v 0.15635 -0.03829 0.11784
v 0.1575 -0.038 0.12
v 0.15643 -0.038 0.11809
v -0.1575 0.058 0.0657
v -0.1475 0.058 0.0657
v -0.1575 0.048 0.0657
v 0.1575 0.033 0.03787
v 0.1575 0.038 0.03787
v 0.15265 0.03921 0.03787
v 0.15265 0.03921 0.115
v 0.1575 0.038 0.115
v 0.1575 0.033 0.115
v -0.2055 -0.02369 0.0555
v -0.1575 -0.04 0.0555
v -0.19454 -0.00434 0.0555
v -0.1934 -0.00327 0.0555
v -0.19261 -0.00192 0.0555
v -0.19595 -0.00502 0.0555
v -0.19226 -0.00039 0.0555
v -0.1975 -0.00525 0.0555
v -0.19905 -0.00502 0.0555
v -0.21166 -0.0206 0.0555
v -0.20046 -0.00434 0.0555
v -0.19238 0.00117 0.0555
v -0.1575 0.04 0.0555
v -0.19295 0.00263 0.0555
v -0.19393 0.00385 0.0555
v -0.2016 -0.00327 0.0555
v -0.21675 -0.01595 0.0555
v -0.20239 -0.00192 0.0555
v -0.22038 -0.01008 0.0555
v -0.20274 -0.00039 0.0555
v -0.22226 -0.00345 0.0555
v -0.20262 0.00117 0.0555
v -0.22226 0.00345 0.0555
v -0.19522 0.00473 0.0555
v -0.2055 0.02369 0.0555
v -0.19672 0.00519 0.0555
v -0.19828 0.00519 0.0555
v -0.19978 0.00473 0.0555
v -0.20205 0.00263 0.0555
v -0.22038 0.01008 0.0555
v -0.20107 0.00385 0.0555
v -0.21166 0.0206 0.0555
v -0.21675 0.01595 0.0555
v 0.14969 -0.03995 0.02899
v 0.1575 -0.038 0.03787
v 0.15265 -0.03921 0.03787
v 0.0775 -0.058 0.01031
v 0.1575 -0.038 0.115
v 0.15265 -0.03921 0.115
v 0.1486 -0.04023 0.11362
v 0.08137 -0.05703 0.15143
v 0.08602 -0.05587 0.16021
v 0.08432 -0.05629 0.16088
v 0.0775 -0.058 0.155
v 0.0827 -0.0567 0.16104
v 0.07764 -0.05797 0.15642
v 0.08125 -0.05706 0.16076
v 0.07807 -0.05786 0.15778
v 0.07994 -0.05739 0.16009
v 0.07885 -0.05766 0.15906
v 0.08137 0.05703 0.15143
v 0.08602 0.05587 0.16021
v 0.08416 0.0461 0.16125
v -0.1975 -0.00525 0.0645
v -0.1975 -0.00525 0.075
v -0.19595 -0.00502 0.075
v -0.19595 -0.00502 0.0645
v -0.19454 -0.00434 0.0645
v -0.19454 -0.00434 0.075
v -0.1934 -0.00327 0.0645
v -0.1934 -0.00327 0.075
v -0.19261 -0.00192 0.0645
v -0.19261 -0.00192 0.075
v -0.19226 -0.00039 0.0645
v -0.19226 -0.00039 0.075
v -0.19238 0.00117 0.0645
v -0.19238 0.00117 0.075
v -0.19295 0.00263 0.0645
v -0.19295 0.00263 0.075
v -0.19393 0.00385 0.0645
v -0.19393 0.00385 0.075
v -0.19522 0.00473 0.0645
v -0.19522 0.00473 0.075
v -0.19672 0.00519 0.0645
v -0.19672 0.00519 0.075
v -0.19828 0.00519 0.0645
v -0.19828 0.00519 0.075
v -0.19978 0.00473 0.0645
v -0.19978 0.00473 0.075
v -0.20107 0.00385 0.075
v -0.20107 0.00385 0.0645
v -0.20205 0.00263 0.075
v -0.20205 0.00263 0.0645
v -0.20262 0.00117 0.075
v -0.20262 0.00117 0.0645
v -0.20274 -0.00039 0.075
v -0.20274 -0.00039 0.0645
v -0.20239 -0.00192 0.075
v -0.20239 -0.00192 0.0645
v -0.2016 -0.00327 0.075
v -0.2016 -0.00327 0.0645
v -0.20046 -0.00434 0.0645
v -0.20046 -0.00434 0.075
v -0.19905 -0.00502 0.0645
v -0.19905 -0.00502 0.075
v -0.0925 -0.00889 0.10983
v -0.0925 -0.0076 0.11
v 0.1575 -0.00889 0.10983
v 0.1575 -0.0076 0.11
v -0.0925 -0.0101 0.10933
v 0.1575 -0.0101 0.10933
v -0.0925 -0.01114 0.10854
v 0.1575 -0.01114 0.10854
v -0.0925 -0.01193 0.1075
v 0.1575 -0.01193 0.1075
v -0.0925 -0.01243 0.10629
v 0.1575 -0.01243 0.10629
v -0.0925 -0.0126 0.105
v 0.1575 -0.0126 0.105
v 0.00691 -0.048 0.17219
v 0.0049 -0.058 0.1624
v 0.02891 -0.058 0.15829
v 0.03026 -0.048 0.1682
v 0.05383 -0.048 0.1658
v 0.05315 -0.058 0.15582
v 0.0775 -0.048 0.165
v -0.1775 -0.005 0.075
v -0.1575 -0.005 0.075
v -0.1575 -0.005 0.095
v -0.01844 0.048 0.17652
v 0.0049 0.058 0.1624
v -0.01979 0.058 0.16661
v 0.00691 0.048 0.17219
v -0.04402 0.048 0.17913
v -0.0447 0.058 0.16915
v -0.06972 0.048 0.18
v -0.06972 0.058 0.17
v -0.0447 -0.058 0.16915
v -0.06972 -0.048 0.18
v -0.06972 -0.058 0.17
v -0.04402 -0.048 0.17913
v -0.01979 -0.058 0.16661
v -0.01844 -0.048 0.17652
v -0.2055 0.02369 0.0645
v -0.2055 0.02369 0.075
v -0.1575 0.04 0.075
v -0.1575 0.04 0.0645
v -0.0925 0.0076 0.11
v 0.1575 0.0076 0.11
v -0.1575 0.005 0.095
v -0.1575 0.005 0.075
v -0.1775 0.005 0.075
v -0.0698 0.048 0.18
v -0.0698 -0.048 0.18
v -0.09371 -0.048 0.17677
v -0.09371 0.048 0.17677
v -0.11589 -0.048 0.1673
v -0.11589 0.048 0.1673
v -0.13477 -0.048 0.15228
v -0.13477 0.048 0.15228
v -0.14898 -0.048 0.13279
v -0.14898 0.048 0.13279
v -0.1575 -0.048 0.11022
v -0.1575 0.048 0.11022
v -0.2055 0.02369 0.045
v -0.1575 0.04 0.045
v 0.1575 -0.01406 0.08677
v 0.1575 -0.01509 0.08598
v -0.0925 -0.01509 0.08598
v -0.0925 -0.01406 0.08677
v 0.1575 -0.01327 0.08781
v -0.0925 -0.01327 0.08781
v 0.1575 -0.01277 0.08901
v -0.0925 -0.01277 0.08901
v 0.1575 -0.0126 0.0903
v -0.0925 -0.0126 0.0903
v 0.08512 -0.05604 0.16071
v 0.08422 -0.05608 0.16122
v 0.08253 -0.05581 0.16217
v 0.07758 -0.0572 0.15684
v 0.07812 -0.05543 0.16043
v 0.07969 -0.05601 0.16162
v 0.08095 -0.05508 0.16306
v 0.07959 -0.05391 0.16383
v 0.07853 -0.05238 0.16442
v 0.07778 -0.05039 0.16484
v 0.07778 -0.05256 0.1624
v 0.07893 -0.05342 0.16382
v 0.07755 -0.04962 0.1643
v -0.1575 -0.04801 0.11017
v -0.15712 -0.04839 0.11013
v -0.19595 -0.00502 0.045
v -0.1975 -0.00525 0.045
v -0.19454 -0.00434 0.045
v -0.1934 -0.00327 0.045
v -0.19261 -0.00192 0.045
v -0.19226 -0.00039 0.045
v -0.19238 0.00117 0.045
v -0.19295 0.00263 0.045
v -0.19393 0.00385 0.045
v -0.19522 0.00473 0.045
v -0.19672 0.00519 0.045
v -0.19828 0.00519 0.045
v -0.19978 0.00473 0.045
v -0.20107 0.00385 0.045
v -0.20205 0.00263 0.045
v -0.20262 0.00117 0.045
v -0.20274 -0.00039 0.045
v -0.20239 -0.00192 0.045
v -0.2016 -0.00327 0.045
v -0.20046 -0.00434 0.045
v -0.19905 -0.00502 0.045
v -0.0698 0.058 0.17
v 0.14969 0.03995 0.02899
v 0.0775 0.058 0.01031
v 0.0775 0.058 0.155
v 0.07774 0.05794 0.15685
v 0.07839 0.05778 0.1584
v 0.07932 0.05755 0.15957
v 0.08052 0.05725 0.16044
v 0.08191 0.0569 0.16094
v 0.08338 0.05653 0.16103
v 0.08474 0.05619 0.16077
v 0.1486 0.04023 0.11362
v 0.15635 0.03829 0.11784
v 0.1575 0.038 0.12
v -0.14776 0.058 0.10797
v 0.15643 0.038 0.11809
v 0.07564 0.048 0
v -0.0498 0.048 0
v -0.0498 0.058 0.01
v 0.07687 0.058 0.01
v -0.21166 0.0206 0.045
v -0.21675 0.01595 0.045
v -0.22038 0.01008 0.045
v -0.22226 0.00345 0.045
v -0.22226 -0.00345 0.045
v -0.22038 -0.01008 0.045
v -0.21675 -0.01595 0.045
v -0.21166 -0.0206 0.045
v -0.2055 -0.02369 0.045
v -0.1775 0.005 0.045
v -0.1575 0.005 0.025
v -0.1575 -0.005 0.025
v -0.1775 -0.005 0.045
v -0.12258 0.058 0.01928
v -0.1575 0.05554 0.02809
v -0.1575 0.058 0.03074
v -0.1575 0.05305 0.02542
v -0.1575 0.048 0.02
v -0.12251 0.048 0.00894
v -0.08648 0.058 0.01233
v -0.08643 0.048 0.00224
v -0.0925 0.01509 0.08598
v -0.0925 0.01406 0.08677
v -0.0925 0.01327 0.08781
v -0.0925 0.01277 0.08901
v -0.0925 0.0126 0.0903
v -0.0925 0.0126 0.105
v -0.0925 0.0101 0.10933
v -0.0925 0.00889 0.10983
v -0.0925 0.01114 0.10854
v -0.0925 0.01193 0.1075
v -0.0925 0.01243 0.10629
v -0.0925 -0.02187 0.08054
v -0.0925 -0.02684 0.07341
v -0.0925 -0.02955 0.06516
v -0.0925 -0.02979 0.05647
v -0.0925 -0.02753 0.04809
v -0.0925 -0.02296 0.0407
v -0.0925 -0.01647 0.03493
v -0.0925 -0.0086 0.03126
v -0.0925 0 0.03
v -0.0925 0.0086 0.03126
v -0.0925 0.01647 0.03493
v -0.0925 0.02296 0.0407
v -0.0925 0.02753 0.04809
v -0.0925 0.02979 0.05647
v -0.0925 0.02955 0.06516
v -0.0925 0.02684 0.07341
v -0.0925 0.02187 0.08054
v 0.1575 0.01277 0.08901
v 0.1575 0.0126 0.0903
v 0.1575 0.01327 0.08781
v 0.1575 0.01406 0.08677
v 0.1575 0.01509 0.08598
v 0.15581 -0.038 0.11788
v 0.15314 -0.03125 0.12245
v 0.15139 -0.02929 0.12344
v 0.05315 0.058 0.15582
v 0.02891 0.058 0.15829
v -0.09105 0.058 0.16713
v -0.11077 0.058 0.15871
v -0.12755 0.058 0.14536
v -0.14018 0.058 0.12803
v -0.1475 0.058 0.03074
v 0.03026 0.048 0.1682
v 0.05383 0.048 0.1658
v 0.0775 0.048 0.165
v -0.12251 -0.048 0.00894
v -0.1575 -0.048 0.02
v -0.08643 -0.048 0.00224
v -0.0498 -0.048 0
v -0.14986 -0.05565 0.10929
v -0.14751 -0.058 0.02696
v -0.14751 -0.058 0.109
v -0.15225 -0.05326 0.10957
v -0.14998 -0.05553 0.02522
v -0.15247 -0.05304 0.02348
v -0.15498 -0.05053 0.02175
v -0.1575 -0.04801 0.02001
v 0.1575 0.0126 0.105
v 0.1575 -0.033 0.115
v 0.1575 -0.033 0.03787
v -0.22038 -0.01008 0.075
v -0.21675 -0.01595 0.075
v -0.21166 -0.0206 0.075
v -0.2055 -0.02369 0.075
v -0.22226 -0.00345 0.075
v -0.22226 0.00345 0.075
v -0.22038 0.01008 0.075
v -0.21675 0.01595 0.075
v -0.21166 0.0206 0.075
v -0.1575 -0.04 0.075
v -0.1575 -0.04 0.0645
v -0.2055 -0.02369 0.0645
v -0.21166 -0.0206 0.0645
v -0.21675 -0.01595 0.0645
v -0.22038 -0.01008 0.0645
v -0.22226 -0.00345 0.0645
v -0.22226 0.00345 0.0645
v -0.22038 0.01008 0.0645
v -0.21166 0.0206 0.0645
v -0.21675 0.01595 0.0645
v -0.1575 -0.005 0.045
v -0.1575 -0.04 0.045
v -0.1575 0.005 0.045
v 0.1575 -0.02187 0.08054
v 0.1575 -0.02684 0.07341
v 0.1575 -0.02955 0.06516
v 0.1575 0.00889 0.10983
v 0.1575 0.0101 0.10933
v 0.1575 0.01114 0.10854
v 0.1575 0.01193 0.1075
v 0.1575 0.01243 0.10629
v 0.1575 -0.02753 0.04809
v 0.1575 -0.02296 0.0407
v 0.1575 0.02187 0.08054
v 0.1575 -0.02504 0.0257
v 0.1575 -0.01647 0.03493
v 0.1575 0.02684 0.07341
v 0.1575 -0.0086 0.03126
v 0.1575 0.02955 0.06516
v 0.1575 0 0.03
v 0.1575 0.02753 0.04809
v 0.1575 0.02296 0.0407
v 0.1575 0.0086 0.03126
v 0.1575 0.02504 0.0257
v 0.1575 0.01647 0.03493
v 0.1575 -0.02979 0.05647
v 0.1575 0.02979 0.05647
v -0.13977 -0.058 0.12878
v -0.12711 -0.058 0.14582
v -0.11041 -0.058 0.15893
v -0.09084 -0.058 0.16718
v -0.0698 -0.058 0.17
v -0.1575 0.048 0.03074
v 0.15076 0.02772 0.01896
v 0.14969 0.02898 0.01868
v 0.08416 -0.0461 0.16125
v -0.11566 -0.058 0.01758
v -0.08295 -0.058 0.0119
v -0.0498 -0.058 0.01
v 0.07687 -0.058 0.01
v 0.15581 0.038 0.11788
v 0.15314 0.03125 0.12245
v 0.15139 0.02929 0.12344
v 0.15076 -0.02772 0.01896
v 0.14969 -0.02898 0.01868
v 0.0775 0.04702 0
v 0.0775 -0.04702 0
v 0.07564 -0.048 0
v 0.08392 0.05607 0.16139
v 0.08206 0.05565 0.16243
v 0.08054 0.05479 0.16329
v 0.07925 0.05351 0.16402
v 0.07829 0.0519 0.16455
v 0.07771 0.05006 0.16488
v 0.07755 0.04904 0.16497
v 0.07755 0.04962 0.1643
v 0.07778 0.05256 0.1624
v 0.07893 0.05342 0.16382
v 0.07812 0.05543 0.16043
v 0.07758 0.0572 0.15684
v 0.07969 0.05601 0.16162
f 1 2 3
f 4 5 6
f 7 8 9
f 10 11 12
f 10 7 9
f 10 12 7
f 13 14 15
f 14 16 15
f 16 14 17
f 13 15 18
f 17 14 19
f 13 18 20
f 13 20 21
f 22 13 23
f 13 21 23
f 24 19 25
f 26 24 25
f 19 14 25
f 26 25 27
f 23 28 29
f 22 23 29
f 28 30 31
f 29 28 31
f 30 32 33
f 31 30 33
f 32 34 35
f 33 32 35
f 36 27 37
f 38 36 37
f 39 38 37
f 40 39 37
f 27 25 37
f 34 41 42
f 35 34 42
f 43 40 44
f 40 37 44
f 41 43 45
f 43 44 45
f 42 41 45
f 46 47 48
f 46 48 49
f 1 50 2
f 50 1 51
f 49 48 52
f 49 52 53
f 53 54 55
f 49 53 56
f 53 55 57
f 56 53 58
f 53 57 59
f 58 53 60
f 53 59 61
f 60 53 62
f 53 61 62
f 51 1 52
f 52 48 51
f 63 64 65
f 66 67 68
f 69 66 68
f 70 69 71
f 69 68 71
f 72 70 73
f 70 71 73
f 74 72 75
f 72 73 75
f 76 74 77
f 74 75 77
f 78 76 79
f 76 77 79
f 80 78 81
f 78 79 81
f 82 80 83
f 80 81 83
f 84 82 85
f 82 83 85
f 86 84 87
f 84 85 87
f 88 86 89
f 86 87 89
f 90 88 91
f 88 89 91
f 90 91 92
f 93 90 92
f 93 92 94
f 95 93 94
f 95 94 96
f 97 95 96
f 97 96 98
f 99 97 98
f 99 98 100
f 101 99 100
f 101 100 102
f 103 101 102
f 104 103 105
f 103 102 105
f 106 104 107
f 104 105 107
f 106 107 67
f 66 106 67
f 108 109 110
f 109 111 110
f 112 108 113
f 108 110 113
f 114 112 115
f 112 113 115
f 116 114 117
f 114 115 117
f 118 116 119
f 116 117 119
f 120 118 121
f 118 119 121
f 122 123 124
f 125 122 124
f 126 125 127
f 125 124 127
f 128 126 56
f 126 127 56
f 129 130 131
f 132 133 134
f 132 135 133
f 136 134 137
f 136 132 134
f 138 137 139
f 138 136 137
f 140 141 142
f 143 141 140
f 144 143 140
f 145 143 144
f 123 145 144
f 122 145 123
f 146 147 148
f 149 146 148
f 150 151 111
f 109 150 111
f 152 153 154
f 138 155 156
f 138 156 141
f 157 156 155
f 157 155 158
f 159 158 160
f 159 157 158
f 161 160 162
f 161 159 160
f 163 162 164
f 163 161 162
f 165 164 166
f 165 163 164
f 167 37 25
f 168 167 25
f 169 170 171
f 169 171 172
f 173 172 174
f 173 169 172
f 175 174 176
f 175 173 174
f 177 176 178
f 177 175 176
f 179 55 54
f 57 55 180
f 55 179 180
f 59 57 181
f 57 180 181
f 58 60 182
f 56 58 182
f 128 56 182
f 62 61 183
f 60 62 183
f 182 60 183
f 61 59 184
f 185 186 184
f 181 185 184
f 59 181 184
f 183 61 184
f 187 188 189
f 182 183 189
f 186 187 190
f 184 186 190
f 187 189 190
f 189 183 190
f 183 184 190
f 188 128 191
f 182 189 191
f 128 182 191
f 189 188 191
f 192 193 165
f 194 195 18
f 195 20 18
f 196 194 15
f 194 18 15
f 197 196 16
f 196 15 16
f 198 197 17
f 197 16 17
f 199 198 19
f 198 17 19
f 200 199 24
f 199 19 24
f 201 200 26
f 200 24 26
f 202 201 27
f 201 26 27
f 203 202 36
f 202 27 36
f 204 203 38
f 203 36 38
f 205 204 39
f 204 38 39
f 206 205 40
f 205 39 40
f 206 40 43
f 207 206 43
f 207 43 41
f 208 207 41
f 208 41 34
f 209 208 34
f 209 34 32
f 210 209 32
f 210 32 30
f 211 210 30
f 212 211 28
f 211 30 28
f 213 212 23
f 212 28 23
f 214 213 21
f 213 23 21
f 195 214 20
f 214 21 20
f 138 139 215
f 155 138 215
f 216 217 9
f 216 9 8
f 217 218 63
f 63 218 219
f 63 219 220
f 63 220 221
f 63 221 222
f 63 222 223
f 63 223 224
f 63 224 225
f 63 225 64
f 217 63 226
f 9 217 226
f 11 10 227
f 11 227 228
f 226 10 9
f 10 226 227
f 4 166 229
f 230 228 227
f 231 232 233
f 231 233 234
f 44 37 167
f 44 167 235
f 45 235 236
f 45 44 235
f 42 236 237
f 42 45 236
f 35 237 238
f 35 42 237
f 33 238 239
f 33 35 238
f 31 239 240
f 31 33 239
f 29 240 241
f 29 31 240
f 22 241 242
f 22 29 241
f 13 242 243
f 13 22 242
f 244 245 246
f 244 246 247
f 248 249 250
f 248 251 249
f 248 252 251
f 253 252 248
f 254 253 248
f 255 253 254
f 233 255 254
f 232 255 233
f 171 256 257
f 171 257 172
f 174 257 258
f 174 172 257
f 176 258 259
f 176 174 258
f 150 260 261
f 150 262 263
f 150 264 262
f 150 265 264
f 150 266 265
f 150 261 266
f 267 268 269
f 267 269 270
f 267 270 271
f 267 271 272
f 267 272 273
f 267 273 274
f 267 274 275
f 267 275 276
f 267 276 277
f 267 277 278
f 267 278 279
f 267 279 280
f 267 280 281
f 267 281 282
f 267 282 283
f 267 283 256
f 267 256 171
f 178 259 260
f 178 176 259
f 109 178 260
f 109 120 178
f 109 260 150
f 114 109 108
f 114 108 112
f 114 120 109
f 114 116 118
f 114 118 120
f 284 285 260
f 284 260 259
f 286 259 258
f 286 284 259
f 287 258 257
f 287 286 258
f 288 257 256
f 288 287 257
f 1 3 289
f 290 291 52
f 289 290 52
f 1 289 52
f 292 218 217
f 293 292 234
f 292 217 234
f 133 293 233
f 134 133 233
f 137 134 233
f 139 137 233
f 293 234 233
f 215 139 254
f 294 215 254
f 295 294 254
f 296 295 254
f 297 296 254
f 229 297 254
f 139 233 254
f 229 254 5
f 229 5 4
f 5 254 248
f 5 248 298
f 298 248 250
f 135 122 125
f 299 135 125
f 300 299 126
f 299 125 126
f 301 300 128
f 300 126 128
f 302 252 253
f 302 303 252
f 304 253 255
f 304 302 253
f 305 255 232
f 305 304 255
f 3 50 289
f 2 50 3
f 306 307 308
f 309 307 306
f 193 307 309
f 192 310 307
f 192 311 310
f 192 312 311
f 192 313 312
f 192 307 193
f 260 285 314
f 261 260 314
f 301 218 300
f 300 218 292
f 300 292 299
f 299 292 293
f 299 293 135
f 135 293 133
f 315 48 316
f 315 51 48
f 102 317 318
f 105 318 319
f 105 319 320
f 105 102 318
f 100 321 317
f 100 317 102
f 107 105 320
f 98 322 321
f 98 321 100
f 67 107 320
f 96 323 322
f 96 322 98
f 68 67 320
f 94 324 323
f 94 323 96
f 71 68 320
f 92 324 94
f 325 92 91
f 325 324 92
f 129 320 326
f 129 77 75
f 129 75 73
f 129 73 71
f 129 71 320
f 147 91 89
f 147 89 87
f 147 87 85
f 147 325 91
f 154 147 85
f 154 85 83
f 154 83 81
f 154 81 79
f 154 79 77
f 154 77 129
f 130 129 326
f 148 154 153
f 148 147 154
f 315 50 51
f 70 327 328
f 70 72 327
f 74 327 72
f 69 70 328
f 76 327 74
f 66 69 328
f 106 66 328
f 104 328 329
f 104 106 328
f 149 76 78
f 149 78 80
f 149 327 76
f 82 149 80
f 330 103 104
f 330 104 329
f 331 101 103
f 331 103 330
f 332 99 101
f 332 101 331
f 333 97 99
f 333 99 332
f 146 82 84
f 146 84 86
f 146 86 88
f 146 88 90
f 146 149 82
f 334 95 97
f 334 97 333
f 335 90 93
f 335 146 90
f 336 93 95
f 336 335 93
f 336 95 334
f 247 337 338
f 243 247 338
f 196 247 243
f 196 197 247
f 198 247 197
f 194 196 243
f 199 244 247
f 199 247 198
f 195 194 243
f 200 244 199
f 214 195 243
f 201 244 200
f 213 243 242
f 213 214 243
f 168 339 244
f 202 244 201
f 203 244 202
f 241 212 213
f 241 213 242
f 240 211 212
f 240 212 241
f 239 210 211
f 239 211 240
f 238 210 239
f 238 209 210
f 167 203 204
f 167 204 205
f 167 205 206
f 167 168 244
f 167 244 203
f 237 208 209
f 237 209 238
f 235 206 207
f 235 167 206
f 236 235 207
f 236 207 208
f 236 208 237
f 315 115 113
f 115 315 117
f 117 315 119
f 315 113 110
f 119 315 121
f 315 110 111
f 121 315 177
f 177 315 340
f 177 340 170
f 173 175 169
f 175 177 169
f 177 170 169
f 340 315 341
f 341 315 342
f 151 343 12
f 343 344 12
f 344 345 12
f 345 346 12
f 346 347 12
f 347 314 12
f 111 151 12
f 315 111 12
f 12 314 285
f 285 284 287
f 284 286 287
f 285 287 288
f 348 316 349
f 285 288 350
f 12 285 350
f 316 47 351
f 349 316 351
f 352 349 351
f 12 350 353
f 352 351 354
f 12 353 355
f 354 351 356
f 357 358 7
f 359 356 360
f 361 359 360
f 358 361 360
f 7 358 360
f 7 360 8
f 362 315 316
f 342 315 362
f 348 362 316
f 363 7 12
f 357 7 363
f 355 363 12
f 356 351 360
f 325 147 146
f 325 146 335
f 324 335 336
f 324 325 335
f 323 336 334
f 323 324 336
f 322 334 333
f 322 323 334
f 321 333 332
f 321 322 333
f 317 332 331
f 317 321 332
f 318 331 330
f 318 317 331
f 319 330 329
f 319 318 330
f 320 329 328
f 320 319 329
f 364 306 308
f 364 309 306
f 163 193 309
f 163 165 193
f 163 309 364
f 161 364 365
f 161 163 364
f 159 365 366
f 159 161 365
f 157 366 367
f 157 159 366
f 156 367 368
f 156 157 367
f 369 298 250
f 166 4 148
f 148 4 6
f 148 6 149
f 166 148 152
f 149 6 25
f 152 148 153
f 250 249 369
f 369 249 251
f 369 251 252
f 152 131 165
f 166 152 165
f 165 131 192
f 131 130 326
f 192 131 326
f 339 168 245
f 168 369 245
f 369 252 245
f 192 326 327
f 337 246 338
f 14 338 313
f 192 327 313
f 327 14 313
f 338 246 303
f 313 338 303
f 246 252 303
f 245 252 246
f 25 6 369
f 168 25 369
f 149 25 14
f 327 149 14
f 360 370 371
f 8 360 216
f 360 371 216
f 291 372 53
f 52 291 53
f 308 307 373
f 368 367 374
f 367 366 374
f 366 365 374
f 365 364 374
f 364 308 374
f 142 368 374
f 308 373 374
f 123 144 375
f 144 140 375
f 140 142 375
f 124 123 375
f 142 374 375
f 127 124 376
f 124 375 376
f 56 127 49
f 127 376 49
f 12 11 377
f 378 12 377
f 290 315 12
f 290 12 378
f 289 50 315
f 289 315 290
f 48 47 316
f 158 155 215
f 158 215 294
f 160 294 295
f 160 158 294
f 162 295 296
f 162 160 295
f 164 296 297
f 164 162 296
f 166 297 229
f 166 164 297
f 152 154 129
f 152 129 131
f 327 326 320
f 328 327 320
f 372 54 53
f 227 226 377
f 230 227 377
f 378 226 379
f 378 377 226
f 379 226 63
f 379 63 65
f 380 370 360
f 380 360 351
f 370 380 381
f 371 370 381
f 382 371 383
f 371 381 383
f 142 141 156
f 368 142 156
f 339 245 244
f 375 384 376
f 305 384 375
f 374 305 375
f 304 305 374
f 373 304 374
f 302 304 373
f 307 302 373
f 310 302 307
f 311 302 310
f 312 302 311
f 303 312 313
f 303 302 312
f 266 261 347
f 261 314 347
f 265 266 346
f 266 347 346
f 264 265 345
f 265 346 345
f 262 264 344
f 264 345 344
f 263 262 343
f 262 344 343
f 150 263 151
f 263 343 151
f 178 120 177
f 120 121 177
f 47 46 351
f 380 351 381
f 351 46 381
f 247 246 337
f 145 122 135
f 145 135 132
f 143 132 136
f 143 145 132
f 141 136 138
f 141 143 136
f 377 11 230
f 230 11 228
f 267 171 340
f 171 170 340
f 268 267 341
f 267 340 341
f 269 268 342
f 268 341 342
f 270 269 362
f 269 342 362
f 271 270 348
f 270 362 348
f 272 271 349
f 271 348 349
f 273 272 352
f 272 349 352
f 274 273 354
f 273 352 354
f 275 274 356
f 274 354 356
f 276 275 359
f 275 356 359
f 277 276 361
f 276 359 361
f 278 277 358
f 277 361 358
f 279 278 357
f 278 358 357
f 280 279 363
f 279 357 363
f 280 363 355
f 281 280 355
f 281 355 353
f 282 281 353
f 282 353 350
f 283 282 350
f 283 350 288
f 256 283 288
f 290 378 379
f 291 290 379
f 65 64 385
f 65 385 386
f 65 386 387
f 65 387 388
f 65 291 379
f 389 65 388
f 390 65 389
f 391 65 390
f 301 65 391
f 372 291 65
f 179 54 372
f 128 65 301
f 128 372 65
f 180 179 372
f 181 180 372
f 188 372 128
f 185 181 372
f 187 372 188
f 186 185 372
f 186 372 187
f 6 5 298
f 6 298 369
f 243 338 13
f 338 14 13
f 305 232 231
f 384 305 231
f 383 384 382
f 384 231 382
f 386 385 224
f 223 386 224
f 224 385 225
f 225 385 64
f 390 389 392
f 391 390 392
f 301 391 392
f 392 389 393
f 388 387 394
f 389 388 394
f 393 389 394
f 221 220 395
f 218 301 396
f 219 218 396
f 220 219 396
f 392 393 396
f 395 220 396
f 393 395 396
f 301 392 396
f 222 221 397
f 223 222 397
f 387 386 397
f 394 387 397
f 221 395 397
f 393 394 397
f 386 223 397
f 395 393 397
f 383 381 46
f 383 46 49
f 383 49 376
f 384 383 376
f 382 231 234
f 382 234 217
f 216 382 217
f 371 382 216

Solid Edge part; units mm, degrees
sketch "Sketch1" plane through (0, 0, 0) normal (0, 0, 1) x (1, 0, 0)
  line L0 (-0.1575, -0.058) -> (0.1575, -0.058)
  line L1 (0.1575, -0.058) -> (0.1575, 0.058)
  line L2 (0.1575, 0.058) -> (-0.1575, 0.058)
  line L3 (-0.1575, 0.058) -> (-0.1575, -0.058)
  dimension "D1" = 0.116
  dimension "D2" = 0.315
extrude "Protrusion1" add sketch "Sketch1" along normal blind 0.18
sketch "Sketch2" plane through (0.1575, 0, 0.09) normal (1, 0, 0) x (0, 1, 0)
  line L0 (0.0126, 0.0003) -> (0.0126, 0.015)
  arc A0 (0.0076, 0.02) -> (0.0126, 0.015) centre (0.0076, 0.015) cw
  line L1 (0.0076, 0.02) -> (-0.0076, 0.02)
  arc A1 (-0.0076, 0.02) -> (-0.0126, 0.015) centre (-0.0076, 0.015) ccw
  line L2 (-0.0126, 0.015) -> (-0.0126, 0.0003)
  arc A2 (-0.0151, -0.004) -> (-0.0126, 0.0003) centre (-0.0176, 0.0003) ccw
  arc A3 (0.0126, 0.0003) -> (0.0151, -0.004) centre (0.0176, 0.0003) ccw
  arc A4 (-0.0151, -0.004) -> (0.0151, -0.004) centre (0, -0.03) ccw
extrude "Ausschnitt_1" cut sketch "Sketch2" against normal blind 0.25
sketch "Sketch3" plane through (0, 0, 0) normal (0, -1, 0) x (1, 0, 0)
  line L0 (-0.1575, 0.075) -> (-0.1575, 0.045)
  line L1 (-0.1575, 0.045) -> (-0.2225, 0.045)
  line L2 (-0.2225, 0.045) -> (-0.2225, 0.075)
  line L3 (-0.2225, 0.075) -> (-0.1575, 0.075)
  dimension "D1" = 0.06
  dimension "D2" = 0.03
  dimension "D3" = 0.065
extrude "Ausprägung_2" add sketch "Sketch3" along normal mid plane 0.08
sketch "Sketch4" plane through (-0.19, 0, 0.075) normal (0, 0, 1) x (1, 0, 0)
  line L0 (0.0325, -0.04) -> (-0.0325, -0.04)
  line L1 (-0.0325, -0.04) -> (-0.0325, 0)
  line L2 (0.0325, -0.04) -> (-0.0155, -0.0237)
  arc A0 (-0.0325, 0) -> (-0.0155, -0.0237) centre (-0.0075, 0) ccw
extrude "Cutout1" cut sketch "Sketch4" against normal through all
mirror "Mirror1" about plane through (0, 0, 0) normal (0, -1, 0) of "Cutout1"
hole "Bohrung_1" at (-0.1975, 0, 0.075) direction (0, 0, -1) diameter 0.0105 end through all
sketch "Sketch5" plane through (0, 0, 0) normal (0, -1, 0) x (1, 0, 0)
  line L0 (-0.1575, 0.0645) -> (-0.1575, 0.0555)
  line L1 (-0.1575, 0.0555) -> (-0.2225, 0.0555)
  line L2 (-0.2225, 0.0645) -> (-0.2225, 0.0555)
  line L3 (-0.1575, 0.0645) -> (-0.2225, 0.0645)
  dimension "D1" = 0.015
  dimension "D2" = 0.009
extrude "Cutout3" cut sketch "Sketch5" along normal through all and the other way through all
sketch "Sketch6" plane through (0, 0, 0) normal (0, -1, 0) x (1, 0, 0)
  line L0 (-0.1575, 0.075) -> (-0.1775, 0.075)
  line L1 (-0.1775, 0.075) -> (-0.1575, 0.095)
  line L2 (-0.1575, 0.095) -> (-0.1575, 0.075)
  line L3 (-0.1575, 0.045) -> (-0.1575, 0.025)
  line L4 (-0.1575, 0.025) -> (-0.1775, 0.045)
  line L5 (-0.1775, 0.045) -> (-0.1575, 0.045)
  dimension "D1" = 0.02
extrude "Ausprägung_3" add sketch "Sketch6" along normal mid plane 0.01
sketch "Sketch7" plane through (0, -0.058, 0.09) normal (0, -1, 0) x (1, 0, 0)
  line L0 (-0.1575, -0.07) -> (-0.1575, -0.09)
  line L1 (-0.1575, -0.09) -> (-0.0498, -0.09)
  arc A0 (-0.0498, -0.09) -> (-0.1575, -0.07) centre (-0.0498, 0.21) cw
  line L2 (-0.1575, 0.09) -> (-0.1575, 0.02)
  arc A1 (-0.1575, 0.02) -> (-0.0698, 0.09) centre (-0.0698, 0) cw
  line L3 (-0.0698, 0.09) -> (-0.1575, 0.09)
  dimension "D1" = 0.1575
  dimension "D2" = 0.1575
extrude "Cutout4" cut sketch "Sketch7" against normal through all
sketch "Sketch8" plane through (0, -0.058, 0.09) normal (0, -1, 0) x (1, 0, 0)
  line L0 (0.1575, -0.0693) -> (0.0775, -0.09)
  line L1 (0.1575, -0.09) -> (0.0775, -0.09)
  line L2 (0.1575, -0.0693) -> (0.1575, -0.09)
  line L3 (0.1575, 0.09) -> (-0.0239, 0.09)
  arc A0 (-0.0239, 0.09) -> (0.0775, 0.075) centre (0.0775, 0.425) ccw
  line L4 (0.1575, 0.03) -> (0.0775, 0.075)
  line L5 (0.1575, 0.09) -> (0.1575, 0.03)
  dimension "D1" = 0.1575
extrude "Cutout5" cut sketch "Sketch8" against normal through all
fillet "Round1" radius 0.38 1 edges at (-0.0239, 0, 0.18)
sketch "Sketch9" plane through (-0.0011, 0, 0.18) normal (0, 0, 1) x (1, 0, 0)
  line L0 (0.1586, -0.038) -> (0.0786, -0.058)
  line L1 (0.1586, -0.058) -> (0.0786, -0.058)
  line L2 (0.1586, -0.038) -> (0.1586, -0.058)
  line L3 (0.0786, 0.058) -> (0.1586, 0.038)
  line L4 (0.1586, 0.058) -> (0.1586, 0.038)
  line L5 (0.1586, 0.058) -> (0.0786, 0.058)
  dimension "D1" = 0.02
extrude "Cutout6" cut sketch "Sketch9" against normal through all
chamfer "Fase_1" distance 0.01 angle 45 18 edges at (-0.0312, -0.058, 0.178) (-0.0697, -0.058, 0.18) (-0.1259, -0.058, 0.1604) (0.042, -0.058, 0.1668) (0.1175, -0.048, 0.1425) (-0.1575, -0.058, 0.065) (-0.1046, -0.058, 0.005) (0.0139, -0.058, 0) (0.1175, -0.048, 0.0104) (-0.1259, 0.058, 0.1604) (-0.0697, 0.058, 0.18) (-0.0312, 0.058, 0.178) (0.042, 0.058, 0.1668) (-0.1575, 0.058, 0.065) (-0.1046, 0.058, 0.005) (0.0139, 0.058, 0) (0.1175, 0.048, 0.1425) (0.1175, 0.048, 0.0104)
chamfer "Fase_2" distance 0.005 angle 45 8 edges at (0.1575, 0, 0.12) (0.1575, 0.0329, 0.1143) (0.1575, 0.038, 0.0698) (0.1575, 0.0329, 0.0259) (0.1575, 0, 0.0207) (0.1575, -0.0329, 0.0259) (0.1575, -0.038, 0.0698) (0.1575, -0.0329, 0.1143)
